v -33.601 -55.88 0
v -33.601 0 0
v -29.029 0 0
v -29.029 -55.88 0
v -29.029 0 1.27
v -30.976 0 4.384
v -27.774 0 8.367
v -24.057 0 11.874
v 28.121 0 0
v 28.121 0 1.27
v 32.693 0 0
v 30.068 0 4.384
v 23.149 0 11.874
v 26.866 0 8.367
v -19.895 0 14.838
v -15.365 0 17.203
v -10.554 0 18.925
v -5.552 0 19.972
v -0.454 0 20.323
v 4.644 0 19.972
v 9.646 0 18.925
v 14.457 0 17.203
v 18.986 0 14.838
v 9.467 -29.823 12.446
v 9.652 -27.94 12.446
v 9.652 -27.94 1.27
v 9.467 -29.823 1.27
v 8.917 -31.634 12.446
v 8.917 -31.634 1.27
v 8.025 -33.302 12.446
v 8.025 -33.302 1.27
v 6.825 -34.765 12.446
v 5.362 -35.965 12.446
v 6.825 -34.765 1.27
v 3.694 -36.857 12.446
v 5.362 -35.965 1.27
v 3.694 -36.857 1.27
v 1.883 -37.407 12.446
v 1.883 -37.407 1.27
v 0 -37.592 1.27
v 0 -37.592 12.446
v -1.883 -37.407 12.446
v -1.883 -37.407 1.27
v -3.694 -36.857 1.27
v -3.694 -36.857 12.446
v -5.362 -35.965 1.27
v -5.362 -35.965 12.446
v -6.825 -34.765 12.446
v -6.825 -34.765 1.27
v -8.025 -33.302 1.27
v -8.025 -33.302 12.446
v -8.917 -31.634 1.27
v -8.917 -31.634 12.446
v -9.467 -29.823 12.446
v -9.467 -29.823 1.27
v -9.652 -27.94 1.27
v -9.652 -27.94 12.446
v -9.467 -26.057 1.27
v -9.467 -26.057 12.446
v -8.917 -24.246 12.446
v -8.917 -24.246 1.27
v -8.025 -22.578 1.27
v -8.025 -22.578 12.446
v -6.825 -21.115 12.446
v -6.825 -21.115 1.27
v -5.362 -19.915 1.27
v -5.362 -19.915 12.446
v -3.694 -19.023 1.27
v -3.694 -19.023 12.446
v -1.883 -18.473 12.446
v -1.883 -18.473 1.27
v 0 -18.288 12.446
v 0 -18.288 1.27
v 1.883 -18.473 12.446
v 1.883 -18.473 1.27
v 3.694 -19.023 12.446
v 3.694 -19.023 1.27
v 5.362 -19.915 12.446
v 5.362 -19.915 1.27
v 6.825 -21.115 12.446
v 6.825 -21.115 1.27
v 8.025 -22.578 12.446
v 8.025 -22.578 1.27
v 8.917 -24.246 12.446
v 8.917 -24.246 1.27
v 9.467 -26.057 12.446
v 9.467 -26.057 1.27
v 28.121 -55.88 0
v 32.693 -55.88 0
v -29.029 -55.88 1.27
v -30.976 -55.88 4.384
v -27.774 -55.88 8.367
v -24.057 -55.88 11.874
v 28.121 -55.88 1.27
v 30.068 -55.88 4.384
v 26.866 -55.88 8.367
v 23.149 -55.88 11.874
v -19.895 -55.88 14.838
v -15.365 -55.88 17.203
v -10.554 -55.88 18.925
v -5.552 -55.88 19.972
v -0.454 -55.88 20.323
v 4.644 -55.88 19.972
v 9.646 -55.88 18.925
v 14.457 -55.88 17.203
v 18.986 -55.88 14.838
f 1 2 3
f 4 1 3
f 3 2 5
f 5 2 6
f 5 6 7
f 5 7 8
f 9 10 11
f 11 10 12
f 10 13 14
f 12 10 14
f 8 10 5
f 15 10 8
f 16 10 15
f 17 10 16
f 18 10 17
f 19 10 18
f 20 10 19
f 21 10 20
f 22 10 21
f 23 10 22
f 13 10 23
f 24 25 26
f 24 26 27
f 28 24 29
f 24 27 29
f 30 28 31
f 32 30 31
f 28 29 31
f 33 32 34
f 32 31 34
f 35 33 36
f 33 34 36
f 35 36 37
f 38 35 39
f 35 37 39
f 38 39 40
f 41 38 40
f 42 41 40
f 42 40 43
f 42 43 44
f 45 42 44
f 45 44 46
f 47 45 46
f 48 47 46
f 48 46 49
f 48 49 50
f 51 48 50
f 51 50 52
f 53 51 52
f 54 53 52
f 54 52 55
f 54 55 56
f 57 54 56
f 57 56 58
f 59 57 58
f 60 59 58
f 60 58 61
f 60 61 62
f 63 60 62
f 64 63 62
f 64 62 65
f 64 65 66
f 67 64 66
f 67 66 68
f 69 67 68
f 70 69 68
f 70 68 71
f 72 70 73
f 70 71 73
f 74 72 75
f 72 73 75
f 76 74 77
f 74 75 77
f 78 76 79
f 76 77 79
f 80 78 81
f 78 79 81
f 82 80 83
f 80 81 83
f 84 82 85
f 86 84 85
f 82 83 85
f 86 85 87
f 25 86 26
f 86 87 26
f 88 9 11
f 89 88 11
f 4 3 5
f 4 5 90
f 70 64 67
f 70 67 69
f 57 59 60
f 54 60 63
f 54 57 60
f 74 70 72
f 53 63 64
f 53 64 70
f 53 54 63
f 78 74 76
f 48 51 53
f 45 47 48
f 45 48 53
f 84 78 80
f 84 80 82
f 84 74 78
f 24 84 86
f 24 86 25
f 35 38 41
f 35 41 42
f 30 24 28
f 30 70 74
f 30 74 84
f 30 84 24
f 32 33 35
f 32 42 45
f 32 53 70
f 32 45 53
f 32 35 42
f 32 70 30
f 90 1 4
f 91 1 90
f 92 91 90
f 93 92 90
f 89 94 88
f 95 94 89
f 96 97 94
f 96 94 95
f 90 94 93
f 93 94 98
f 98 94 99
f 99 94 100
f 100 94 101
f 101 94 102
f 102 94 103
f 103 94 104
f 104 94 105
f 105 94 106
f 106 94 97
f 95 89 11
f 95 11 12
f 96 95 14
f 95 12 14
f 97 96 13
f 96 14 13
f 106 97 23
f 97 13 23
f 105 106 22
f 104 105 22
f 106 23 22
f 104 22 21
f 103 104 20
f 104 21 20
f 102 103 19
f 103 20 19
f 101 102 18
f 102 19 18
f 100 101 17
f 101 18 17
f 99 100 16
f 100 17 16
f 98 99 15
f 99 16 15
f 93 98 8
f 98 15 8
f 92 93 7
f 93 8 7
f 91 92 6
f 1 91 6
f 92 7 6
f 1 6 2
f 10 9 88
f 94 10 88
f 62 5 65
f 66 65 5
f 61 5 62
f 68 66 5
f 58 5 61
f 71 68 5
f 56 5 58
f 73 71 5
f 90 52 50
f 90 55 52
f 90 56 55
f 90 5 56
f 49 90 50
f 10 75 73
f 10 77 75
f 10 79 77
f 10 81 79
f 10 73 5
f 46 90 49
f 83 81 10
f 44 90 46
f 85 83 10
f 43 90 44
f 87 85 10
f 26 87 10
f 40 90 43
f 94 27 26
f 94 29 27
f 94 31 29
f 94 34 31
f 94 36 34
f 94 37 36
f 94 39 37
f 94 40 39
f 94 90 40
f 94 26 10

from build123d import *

# Parameters (mm, degrees)
F1_DEPTH = 55.88
F2_R     = 9.652
F3_DEPTH = 12.446
F4_W     = 57.15
F4_H     = 55.88
F5_DEPTH = 1.27


with BuildPart() as f1:
    # F0 (on Front) → F1 (new body)
    with BuildSketch(Plane.XZ):
        with BuildLine():
            Line((-33.601068, 0), (32.692932, 0))
            ThreePointArc((32.692932, 0), (-0.454068, 20.322772), (-33.601068, 0))
        make_face()
    extrude(amount=F1_DEPTH)

    # F2 (on face) → F3 (cut)
    with BuildSketch(Plane(origin=(0, 0, 0), x_dir=(1, 0, 0), z_dir=(0, 0, -1))):
        with Locations((0, 27.94)):
            Circle(F2_R)
    extrude(amount=-F3_DEPTH, mode=Mode.SUBTRACT)

    # F4 (on face) → F5 (cut)
    with BuildSketch(Plane(origin=(0, 0, 0), x_dir=(1, 0, 0), z_dir=(0, 0, -1))):
        with Locations((-0.454068, 27.94)):
            Rectangle(F4_W, F4_H)
    extrude(amount=-F5_DEPTH, mode=Mode.SUBTRACT)


solid = f1.part
